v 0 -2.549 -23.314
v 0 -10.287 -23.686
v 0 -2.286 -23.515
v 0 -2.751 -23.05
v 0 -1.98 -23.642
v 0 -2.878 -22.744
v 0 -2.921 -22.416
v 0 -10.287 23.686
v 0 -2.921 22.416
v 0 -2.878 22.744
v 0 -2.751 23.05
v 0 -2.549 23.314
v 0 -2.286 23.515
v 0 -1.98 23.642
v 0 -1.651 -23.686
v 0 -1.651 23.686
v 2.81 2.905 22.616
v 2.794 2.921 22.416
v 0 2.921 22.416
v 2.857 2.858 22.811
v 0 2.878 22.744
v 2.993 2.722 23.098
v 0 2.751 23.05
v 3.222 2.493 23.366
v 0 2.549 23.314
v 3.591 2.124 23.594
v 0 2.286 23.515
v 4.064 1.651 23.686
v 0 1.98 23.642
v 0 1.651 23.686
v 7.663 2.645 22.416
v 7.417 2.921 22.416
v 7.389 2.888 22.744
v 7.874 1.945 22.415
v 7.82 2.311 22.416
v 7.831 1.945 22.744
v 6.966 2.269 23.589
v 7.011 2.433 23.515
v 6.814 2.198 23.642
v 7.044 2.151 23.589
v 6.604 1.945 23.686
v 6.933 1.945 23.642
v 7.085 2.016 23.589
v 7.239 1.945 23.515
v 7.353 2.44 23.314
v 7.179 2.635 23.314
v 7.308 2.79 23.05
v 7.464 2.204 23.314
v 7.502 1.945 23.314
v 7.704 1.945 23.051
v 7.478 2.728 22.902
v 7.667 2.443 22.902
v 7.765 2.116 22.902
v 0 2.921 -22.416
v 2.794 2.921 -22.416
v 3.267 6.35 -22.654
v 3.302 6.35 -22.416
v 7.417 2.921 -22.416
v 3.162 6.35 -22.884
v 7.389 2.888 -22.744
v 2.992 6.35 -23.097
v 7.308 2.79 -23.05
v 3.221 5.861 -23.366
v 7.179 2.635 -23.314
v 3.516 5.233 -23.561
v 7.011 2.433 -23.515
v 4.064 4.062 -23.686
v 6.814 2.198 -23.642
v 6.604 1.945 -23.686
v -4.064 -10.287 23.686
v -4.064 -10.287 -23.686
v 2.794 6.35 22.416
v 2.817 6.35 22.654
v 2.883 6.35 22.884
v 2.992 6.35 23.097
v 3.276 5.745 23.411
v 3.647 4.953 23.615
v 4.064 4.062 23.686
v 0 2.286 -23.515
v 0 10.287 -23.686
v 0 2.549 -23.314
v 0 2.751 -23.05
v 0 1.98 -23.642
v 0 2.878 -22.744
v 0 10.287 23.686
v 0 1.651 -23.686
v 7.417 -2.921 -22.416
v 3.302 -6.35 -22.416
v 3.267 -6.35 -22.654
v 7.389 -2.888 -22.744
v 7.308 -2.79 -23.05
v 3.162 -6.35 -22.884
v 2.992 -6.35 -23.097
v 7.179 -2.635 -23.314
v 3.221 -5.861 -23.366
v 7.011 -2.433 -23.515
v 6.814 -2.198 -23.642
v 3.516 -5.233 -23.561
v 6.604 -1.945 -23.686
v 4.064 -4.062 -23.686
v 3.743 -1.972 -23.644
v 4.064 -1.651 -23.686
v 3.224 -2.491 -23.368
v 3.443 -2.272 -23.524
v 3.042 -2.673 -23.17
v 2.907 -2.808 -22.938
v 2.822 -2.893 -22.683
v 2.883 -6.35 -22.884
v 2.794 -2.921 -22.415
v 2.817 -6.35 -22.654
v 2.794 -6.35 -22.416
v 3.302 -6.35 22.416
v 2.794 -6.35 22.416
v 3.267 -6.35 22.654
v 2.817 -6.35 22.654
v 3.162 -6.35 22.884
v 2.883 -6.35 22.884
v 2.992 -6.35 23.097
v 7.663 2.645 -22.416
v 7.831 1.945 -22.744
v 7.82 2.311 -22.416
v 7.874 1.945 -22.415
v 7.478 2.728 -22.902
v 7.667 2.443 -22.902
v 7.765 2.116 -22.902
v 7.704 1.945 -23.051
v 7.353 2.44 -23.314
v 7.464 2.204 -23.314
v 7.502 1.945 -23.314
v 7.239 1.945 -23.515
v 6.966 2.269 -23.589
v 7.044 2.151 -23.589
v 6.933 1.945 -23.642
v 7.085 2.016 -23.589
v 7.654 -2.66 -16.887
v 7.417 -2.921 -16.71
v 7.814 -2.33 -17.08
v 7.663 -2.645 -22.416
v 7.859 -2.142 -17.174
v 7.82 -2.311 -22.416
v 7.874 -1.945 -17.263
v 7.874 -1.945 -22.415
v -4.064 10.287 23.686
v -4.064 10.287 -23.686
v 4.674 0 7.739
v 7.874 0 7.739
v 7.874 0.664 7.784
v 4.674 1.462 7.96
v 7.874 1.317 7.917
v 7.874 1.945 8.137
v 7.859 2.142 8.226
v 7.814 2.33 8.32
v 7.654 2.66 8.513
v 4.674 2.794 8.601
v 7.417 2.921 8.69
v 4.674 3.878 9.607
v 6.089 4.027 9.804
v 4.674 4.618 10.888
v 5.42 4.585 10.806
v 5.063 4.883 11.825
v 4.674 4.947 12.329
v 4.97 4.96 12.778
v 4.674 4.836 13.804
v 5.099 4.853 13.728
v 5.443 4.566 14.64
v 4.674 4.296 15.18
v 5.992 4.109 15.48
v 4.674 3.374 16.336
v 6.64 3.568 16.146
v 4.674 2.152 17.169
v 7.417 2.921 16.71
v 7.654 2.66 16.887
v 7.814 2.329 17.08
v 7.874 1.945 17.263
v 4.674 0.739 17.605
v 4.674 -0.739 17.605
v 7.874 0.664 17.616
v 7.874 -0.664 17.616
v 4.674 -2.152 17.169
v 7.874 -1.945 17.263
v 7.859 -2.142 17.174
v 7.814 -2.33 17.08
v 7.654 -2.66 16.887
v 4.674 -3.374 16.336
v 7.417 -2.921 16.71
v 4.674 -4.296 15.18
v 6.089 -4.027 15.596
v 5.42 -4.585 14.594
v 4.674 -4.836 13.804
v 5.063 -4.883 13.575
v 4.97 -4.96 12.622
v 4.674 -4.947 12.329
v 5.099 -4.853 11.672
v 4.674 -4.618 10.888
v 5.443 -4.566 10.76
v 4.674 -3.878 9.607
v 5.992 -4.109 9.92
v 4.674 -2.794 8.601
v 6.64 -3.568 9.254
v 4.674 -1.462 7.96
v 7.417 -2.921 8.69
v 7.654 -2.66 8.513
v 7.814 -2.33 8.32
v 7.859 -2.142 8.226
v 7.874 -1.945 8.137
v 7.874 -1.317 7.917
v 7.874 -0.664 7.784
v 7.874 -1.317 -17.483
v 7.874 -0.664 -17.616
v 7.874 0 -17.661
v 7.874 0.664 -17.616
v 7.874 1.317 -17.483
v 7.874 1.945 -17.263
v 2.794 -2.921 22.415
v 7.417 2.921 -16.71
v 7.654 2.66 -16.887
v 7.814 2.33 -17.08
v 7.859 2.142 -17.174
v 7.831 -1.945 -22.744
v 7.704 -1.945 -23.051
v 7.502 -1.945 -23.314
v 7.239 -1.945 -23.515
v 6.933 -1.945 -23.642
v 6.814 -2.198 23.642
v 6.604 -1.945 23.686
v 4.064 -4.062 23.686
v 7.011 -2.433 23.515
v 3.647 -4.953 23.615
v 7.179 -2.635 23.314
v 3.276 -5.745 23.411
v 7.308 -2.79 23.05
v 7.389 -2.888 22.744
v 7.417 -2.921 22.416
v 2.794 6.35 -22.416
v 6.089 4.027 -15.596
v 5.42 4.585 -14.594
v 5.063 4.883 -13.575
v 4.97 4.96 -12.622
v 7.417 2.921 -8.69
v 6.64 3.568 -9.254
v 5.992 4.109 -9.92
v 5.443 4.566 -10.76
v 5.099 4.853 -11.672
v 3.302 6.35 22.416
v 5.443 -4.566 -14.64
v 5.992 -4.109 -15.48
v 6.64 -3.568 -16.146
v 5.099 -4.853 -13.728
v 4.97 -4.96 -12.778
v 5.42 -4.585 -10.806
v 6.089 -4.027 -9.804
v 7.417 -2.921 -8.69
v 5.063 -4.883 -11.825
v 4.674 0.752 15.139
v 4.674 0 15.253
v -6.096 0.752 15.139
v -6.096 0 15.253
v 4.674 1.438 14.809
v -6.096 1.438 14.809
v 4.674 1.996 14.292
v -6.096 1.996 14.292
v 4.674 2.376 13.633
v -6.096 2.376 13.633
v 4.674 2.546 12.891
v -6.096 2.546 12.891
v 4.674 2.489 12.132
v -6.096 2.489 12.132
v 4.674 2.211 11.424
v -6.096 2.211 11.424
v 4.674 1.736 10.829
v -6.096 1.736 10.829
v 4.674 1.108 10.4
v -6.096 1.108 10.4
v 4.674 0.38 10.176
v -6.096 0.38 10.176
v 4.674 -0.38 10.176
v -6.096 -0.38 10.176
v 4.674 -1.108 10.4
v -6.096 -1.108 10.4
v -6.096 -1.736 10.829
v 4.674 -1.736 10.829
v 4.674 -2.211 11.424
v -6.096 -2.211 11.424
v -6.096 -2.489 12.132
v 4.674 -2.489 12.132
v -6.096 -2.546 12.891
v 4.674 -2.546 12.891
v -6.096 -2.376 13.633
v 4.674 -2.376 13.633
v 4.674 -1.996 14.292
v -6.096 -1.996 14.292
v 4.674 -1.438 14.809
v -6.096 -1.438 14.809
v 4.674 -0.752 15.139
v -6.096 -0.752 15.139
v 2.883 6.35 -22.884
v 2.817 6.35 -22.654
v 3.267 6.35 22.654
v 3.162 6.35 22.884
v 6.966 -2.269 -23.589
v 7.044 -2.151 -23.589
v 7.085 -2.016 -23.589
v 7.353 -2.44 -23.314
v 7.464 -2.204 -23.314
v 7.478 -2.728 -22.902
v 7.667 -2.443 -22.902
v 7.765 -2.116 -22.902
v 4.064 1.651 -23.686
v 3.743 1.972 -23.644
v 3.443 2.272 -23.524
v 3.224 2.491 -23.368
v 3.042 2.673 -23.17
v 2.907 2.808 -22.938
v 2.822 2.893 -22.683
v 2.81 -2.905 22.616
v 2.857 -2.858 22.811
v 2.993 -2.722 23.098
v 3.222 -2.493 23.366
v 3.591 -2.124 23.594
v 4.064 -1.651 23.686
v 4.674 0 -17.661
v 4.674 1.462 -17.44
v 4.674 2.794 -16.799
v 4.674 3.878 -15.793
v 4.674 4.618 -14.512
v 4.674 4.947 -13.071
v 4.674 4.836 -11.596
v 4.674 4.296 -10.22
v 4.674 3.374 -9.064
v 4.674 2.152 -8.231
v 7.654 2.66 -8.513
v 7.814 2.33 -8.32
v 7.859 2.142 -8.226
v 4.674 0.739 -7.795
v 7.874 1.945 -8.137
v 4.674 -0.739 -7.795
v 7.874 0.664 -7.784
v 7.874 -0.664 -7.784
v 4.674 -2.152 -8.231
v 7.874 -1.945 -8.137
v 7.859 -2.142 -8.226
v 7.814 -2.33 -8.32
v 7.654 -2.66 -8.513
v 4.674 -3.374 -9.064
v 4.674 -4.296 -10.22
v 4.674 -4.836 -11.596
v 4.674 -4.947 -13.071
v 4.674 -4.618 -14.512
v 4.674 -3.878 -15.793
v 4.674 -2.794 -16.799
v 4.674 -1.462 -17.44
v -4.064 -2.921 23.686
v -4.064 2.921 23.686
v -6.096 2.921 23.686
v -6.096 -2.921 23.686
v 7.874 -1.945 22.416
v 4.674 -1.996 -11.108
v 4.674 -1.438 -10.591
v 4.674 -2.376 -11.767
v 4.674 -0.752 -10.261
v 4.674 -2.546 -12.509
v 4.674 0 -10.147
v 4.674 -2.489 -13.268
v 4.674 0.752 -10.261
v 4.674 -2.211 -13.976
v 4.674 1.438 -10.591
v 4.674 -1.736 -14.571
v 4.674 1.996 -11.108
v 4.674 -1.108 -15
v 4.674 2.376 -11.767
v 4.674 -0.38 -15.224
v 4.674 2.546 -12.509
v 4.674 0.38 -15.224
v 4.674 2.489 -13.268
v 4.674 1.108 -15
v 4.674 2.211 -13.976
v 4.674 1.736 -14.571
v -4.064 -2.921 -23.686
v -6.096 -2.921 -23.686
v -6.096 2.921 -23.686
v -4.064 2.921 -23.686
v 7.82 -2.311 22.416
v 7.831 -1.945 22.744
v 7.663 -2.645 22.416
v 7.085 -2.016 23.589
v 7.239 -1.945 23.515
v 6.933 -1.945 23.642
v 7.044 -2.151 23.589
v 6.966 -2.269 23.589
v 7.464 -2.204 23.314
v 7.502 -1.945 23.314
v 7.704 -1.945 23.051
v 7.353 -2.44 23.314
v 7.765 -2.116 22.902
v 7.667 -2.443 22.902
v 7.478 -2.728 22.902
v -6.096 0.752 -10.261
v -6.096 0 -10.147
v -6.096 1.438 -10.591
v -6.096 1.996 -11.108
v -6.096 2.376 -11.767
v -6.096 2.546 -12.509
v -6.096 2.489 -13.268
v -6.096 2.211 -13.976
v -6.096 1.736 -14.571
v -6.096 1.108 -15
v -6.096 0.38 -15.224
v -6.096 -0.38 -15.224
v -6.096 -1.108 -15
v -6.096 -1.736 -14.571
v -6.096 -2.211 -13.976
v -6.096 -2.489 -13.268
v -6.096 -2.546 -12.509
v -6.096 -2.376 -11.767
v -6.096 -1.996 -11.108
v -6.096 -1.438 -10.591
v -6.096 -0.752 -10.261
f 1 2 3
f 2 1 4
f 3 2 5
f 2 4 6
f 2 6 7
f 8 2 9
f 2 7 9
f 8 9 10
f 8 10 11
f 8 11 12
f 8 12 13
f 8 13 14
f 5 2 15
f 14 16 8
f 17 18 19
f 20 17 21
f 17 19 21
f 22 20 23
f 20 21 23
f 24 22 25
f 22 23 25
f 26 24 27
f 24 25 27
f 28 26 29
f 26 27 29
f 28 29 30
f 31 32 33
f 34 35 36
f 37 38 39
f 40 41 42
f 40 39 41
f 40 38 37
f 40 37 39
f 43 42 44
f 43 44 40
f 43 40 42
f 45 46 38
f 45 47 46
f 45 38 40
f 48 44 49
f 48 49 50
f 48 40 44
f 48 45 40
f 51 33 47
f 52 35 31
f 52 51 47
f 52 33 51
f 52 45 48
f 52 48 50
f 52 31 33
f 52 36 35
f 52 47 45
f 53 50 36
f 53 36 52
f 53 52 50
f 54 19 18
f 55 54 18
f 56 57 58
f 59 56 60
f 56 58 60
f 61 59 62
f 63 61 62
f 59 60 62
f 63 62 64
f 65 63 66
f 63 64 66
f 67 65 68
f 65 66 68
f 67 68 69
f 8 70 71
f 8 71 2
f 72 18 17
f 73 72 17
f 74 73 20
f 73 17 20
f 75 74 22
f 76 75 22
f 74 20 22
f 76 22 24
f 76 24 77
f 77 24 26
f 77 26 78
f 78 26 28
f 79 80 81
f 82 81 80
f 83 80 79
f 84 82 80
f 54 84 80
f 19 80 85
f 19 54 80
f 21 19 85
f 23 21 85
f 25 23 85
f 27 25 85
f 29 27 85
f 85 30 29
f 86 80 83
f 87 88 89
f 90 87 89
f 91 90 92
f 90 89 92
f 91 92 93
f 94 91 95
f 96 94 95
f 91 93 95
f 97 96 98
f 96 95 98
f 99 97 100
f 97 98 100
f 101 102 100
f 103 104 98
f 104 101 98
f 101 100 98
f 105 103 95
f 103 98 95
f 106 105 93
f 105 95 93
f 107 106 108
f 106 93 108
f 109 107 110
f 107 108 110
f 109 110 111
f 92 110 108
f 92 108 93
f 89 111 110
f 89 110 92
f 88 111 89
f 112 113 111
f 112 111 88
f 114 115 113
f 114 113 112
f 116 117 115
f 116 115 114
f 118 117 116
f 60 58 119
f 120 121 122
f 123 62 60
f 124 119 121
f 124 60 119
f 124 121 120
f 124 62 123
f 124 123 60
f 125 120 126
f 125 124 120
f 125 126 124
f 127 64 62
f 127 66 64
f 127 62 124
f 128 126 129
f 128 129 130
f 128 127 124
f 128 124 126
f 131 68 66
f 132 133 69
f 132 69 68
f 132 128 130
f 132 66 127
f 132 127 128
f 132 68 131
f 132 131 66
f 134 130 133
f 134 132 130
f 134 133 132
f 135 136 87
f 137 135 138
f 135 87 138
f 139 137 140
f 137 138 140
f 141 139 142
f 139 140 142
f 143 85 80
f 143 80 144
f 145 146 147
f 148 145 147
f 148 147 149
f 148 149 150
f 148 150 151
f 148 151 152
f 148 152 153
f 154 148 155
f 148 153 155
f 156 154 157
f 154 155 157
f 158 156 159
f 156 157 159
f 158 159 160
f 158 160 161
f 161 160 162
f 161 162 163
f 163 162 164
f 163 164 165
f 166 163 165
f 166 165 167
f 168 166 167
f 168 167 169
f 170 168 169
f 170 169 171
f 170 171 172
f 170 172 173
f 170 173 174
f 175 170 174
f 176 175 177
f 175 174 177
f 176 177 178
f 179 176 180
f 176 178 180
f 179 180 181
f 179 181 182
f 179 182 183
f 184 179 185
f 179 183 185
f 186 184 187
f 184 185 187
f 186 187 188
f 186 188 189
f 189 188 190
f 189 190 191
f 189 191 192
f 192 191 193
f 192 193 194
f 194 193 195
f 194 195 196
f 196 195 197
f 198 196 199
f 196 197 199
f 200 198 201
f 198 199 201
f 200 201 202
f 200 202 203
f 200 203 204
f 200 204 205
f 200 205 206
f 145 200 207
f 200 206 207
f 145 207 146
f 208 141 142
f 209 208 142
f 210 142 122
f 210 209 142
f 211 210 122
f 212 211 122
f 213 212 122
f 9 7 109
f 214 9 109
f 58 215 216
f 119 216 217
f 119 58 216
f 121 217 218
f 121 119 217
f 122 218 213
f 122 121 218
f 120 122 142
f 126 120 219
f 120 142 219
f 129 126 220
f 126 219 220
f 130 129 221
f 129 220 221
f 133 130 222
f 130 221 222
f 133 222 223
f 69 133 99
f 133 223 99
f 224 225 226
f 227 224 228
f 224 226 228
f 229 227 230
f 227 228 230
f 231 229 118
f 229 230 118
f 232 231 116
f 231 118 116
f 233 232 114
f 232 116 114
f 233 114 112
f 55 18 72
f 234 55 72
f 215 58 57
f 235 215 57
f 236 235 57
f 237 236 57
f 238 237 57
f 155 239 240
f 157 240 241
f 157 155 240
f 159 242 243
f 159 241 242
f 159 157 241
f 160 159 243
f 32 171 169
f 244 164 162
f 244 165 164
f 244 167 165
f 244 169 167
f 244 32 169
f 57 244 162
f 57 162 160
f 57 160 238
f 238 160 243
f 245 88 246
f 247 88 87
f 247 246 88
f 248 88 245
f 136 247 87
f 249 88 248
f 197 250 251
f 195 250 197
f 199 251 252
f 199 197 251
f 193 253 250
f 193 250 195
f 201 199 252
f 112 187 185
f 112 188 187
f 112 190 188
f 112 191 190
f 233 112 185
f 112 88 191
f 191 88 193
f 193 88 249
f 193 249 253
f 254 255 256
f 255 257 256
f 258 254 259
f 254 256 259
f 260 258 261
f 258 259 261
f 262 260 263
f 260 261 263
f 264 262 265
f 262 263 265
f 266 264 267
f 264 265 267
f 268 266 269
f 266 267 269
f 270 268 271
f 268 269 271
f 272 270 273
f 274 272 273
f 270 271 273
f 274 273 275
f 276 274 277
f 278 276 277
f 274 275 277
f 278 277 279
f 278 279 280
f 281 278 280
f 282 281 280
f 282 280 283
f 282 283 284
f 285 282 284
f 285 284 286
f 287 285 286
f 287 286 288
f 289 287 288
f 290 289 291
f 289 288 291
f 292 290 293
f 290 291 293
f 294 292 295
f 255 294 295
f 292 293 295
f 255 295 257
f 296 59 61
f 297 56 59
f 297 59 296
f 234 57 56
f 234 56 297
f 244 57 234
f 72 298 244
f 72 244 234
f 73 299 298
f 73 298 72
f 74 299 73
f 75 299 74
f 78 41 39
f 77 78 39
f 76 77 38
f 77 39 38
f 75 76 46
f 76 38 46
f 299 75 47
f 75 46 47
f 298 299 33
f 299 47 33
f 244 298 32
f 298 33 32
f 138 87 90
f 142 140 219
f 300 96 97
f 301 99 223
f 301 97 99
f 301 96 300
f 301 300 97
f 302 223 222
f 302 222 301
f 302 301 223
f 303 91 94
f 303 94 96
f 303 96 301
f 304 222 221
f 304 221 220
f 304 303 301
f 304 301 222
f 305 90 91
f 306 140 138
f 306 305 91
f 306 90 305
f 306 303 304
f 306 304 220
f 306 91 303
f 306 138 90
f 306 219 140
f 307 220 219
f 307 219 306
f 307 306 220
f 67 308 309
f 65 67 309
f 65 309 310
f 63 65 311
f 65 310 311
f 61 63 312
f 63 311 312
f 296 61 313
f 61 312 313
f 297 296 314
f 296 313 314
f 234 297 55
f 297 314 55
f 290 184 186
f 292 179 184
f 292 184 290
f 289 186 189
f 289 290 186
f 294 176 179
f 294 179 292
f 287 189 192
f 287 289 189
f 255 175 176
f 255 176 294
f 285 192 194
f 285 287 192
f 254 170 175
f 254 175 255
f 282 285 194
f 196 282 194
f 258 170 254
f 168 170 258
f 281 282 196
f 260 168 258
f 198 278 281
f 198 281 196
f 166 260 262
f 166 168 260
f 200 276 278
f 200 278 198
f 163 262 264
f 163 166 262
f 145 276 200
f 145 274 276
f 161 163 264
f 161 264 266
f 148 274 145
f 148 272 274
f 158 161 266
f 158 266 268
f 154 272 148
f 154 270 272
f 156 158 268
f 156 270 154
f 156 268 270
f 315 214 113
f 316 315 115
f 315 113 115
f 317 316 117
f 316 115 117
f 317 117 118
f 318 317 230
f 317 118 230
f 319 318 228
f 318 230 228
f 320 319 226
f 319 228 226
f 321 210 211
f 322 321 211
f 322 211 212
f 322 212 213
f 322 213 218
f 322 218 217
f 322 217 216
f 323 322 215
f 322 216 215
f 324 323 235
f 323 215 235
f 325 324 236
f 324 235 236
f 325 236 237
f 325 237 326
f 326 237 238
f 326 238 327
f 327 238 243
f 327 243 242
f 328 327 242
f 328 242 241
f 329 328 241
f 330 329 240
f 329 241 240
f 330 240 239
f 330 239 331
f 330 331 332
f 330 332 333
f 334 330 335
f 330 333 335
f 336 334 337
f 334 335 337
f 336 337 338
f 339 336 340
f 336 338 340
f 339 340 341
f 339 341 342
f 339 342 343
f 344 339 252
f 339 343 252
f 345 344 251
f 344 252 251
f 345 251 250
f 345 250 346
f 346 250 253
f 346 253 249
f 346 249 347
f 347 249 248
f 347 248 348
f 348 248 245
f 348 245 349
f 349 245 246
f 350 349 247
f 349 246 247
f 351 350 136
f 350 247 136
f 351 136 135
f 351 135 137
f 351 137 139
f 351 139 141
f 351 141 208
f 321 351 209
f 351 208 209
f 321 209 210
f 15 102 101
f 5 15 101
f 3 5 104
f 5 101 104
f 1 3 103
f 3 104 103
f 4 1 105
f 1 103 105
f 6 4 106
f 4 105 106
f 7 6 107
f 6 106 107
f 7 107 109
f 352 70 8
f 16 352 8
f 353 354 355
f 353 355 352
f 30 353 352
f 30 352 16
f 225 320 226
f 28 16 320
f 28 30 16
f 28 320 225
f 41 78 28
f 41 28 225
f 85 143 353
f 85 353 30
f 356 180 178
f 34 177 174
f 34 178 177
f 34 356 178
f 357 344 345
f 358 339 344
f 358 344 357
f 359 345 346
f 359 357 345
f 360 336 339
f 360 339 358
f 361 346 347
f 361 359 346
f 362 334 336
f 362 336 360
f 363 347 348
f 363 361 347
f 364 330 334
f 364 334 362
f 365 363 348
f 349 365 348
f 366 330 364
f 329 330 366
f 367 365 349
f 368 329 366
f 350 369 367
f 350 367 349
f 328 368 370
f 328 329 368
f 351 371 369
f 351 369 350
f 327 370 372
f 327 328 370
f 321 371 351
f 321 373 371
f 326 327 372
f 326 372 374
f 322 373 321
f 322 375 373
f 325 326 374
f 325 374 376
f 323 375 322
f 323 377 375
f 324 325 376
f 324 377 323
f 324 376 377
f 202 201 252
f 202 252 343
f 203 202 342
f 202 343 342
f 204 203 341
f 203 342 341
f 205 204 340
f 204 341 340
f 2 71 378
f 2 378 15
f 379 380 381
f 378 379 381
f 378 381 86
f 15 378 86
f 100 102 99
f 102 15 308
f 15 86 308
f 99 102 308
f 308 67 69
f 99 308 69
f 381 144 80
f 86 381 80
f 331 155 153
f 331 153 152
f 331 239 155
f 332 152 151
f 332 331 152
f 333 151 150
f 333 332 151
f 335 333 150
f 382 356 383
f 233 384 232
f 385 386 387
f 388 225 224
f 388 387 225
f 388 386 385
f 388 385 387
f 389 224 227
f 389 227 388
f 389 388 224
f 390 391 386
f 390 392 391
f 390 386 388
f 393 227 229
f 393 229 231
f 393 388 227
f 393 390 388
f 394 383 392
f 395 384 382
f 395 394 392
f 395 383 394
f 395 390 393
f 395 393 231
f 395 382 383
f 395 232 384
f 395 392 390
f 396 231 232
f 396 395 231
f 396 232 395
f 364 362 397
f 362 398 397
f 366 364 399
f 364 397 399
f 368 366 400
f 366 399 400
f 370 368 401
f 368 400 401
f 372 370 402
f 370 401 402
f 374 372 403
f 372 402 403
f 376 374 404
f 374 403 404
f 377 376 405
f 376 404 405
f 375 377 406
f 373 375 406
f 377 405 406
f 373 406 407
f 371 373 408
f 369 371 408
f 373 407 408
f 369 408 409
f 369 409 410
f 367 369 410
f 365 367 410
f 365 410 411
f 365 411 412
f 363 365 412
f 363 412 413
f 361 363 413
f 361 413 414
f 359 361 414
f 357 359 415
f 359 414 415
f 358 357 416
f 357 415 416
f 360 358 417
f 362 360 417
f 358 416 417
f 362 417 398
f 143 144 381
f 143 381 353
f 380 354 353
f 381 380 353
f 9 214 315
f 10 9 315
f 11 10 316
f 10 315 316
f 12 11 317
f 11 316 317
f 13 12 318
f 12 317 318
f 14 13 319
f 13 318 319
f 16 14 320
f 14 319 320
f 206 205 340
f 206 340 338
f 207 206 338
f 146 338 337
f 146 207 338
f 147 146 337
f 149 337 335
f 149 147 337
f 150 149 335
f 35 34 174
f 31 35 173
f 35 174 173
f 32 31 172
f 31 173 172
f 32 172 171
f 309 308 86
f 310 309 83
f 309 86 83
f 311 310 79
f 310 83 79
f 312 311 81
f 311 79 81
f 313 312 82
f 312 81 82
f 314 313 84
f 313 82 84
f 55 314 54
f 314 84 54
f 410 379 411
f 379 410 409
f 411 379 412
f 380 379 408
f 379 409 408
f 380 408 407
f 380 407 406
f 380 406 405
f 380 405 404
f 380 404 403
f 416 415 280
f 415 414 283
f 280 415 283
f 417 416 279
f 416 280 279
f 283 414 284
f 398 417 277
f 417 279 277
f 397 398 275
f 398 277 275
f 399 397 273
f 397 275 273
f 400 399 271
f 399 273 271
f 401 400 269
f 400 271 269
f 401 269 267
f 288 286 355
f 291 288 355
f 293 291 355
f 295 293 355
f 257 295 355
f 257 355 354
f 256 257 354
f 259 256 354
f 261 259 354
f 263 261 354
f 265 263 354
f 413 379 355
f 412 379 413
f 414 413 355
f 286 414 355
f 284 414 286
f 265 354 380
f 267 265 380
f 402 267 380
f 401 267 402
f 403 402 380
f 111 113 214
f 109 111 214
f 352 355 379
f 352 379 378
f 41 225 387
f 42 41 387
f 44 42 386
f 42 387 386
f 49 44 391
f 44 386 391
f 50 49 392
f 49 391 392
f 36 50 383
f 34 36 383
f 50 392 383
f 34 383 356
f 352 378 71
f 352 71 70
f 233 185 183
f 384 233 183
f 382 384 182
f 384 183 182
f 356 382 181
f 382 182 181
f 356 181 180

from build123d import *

# Parameters (mm, degrees)
BOSS_EXTRUDE1_DEPTH                             = 47.371
SKETCH2_W                                       = 6.858
SKETCH2_H                                       = 3.429
CUT_EXTRUDE1_DEPTH                              = 49.438972089
SKETCH3_W                                       = 4.064
SKETCH3_H                                       = 47.371
BOSS_EXTRUDE2_DEPTH                             = 7.366
SKETCH4_W                                       = 6.858
SKETCH4_H                                       = 3.429
CUT_EXTRUDE2_DEPTH                              = 50.110425431
SKETCH5_W                                       = 4.064
SKETCH5_H                                       = 47.371
BOSS_EXTRUDE3_DEPTH                             = 7.366
F_3_CLEARANCE_HOLE1_D                           = 2.7686
SKETCH9_W                                       = 2.032
SKETCH9_H                                       = 5.842
BOSS_EXTRUDE4_DEPTH                             = 47.371
SKETCH10_R                                      = 1.3843
CUT_EXTRUDE3_DEPTH                              = 2.54
CBORE_FOR_10_BUTTON_HEAD_CAP_SCREW1_D           = 5.1054
CBORE_FOR_10_BUTTON_HEAD_CAP_SCREW1_CBORE_D     = 9.92124
CBORE_FOR_10_BUTTON_HEAD_CAP_SCREW1_CBORE_DEPTH = 3.2004
FILLET1_R                                       = 1.27
FILLET3_R                                       = 1.27
FILLET5_R                                       = 1.27


with BuildPart() as part:
    # Sketch1 → Boss-Extrude1 (new body)
    with BuildSketch(Plane.XY.offset(23.6855)):
        Polygon((3.302, 6.35), (-4.064, 6.35), (-4.064, -6.35), (3.302, -6.35), (7.874, -2.54), (7.874, 2.54), align=None)
    extrude(amount=-BOSS_EXTRUDE1_DEPTH)

    # Sketch2 → Cut-Extrude1 (cut, through all)
    with BuildSketch(Plane.XY.offset(23.6855)):
        with Locations((-0.635, 4.6355)):
            Rectangle(SKETCH2_W, SKETCH2_H)
    extrude(amount=-CUT_EXTRUDE1_DEPTH, mode=Mode.SUBTRACT)

    # Sketch3 → Boss-Extrude2 (add)
    with BuildSketch(Plane(origin=(0, 2.921, 0), x_dir=(-1, 0, 0), z_dir=(0, 1, 0))):
        with Locations((2.032, 0)):
            Rectangle(SKETCH3_W, SKETCH3_H)
    extrude(amount=BOSS_EXTRUDE2_DEPTH)

    # Sketch4 → Cut-Extrude2 (cut, through all)
    with BuildSketch(Plane.XY.offset(23.6855)):
        with Locations((-0.635, -4.6355)):
            Rectangle(SKETCH4_W, SKETCH4_H)
    extrude(amount=-CUT_EXTRUDE2_DEPTH, mode=Mode.SUBTRACT)

    # Sketch5 → Boss-Extrude3 (add)
    with BuildSketch(Plane.XZ.offset(2.921)):
        with Locations((-2.032, 0)):
            Rectangle(SKETCH5_W, SKETCH5_H)
    extrude(amount=BOSS_EXTRUDE3_DEPTH)

    # #3 Clearance Hole1 (through all)
    with Locations(Plane.ZY.offset(4.064)):
        with Locations((12.7, 0), (-12.7, 0)):
            Hole(F_3_CLEARANCE_HOLE1_D / 2)

    # Sketch9 → Boss-Extrude4 (add, through all)
    with BuildSketch(Plane.XY.offset(23.6855)):
        with Locations((-5.08, 0)):
            Rectangle(SKETCH9_W, SKETCH9_H)
    extrude(amount=-BOSS_EXTRUDE4_DEPTH)

    # Sketch10 → Cut-Extrude3 (cut)
    with BuildSketch(Plane(origin=(-4.064, 0, 0), x_dir=(0, 0, -1), z_dir=(1, 0, 0))):
        with Locations(Location((-12.7, 0, 0), (0, 0, 180))):
            Circle(SKETCH10_R)
    extrude(amount=-CUT_EXTRUDE3_DEPTH, mode=Mode.SUBTRACT)

    # CBORE for #10 Button Head Cap Screw1 (through all)
    with Locations(Plane(origin=(7.874, 0, 0), x_dir=(0, 0, -1), z_dir=(1, 0, 0))):
        with Locations((-12.7, 0), (12.7, 0)):
            CounterBoreHole(CBORE_FOR_10_BUTTON_HEAD_CAP_SCREW1_D / 2, CBORE_FOR_10_BUTTON_HEAD_CAP_SCREW1_CBORE_D / 2, CBORE_FOR_10_BUTTON_HEAD_CAP_SCREW1_CBORE_DEPTH)

    # Fillet1
    fillet1_edges = [part.edges().sort_by_distance(p)[0] for p in [
        (7.874, -2.54, 20.323251747),
        (7.874, -2.54, -20.323251747),
        (7.874, -2.54, 0),
        (7.874, 2.54, 20.323251747),
        (7.874, 2.54, 0),
        (7.874, 2.54, -20.323251747),
    ]]
    fillet(fillet1_edges, radius=FILLET1_R)

    # Fillet3
    # the kernel refuses this fillet: 1.27 mm, written as the material it takes off along each edge
    with BuildSketch(Plane(origin=(0.862897437, -8.382585469, -23.6855), x_dir=(0, 0, 1), z_dir=(0.7682212795973759, 0.6401843996644799, 0)), Plane(origin=(7.417034188, 2.920804844, -23.6855), x_dir=(0, 0, 1), z_dir=(-0.7682212795973759, 0.6401843996644799, 0))) as fillet3_piece_1:
        with BuildLine():
            CenterArc((FILLET3_R, -FILLET3_R), FILLET3_R, 90, 90)
            Line((0, -FILLET3_R), (0, 0))
            Line((0, 0), (FILLET3_R, 0))
        make_face()
    extrude(amount=8.531574072, mode=Mode.SUBTRACT)
    with BuildSketch(Plane(origin=(6.604, -1.945163819, -23.6855), x_dir=(0.6401843996644796, -0.7682212795973762, 0), z_dir=(-0.7682212795973762, -0.6401843996644796, 0))) as fillet3_piece_2:
        with BuildLine():
            CenterArc((1.27 - FILLET3_R, FILLET3_R), FILLET3_R, 270, 90)
            Line((1.27, FILLET3_R), (1.27, 0))
            Line((1.27, 0), (1.27 - FILLET3_R, 0))
        make_face()
    revolve(axis=Axis((6.604, -1.945163819, -23.6855), (0, 0, 1)), revolution_arc=50.194428908, mode=Mode.SUBTRACT)
    with BuildSketch(Plane(origin=(6.604, 1.945163819, -23.6855), x_dir=(0.6401843996644799, 0.7682212795973757, 0), z_dir=(-0.7682212795973757, 0.6401843996644799, 0))) as fillet3_piece_3:
        with BuildLine():
            CenterArc((1.27 - FILLET3_R, -FILLET3_R), FILLET3_R, 0, 90)
            Line((1.27, -FILLET3_R), (1.27, 0))
            Line((1.27, 0), (1.27 - FILLET3_R, 0))
        make_face()
    revolve(axis=Axis((6.604, 1.945163819, -23.6855), (0, 0, -1)), revolution_arc=50.194428908, mode=Mode.SUBTRACT)
    with BuildSketch(Plane(origin=(2.794, -2.921, -23.6855), x_dir=(0, 0, 1), z_dir=(-1, 0, 0)), Plane(origin=(0, 2.921, -23.6855), x_dir=(0, 0, 1), z_dir=(1, 0, 0))) as fillet3_piece_4:
        with BuildLine():
            CenterArc((FILLET3_R, FILLET3_R), FILLET3_R, 180, 90)
            Line((0, FILLET3_R), (0, 0))
            Line((0, 0), (FILLET3_R, 0))
        make_face()
    extrude(amount=2.794, mode=Mode.SUBTRACT)
    with BuildSketch(Plane(origin=(2.794, 2.921, -23.6855), x_dir=(0, 0, 1), z_dir=(0, 1, 0)), Plane(origin=(2.794, -9.525, -23.6855), x_dir=(0, 0, 1), z_dir=(0, 1, 0))) as fillet3_piece_5:
        with BuildLine():
            CenterArc((FILLET3_R, FILLET3_R), FILLET3_R, 180, 90)
            Line((0, FILLET3_R), (0, 0))
            Line((0, 0), (FILLET3_R, 0))
        make_face()
    extrude(amount=6.604, mode=Mode.SUBTRACT)
    with BuildSketch(Plane(origin=(7.874, -1.945163819, -23.6855), x_dir=(-1, 0, 0), z_dir=(0, 1, 0))) as fillet3_piece_6:
        with BuildLine():
            CenterArc((FILLET3_R, FILLET3_R), FILLET3_R, 180, 90)
            Line((0, FILLET3_R), (0, 0))
            Line((0, 0), (FILLET3_R, 0))
        make_face()
    extrude(amount=3.890327637, mode=Mode.SUBTRACT)
    with BuildSketch(Plane(origin=(2.794, -9.525, -23.6855), x_dir=(0, 0, 1), z_dir=(0, 1, 0))) as fillet3_piece_7a_section:
        with BuildLine():
            CenterArc((FILLET3_R, FILLET3_R), FILLET3_R, 180, 90)
            Line((0, FILLET3_R), (0, 0))
            Line((0, 0), (FILLET3_R, 0))
        make_face()
    fillet3_piece_7a = extrude(amount=9.779, mode=Mode.PRIVATE)
    fillet3_piece_7a = split(fillet3_piece_7a, bisect_by=Plane(origin=(3.081521795, -2.921, -23.397978205), z_dir=(0, 1, 0)), keep=Keep.TOP, mode=Mode.PRIVATE)
    with BuildSketch(Plane(origin=(5.969, -2.921, -23.6855), x_dir=(0, 0, 1), z_dir=(-1, 0, 0))) as fillet3_piece_7b_section:
        with BuildLine():
            CenterArc((FILLET3_R, FILLET3_R), FILLET3_R, 180, 90)
            Line((0, FILLET3_R), (0, 0))
            Line((0, 0), (FILLET3_R, 0))
        make_face()
    fillet3_piece_7b = extrude(amount=5.969, mode=Mode.PRIVATE)
    fillet3_piece_7b = split(fillet3_piece_7b, bisect_by=Plane(origin=(2.794, -2.633478205, -23.397978205), z_dir=(1, 0, 0)), keep=Keep.TOP, mode=Mode.PRIVATE)
    fillet3_piece_7 = fillet3_piece_7a & fillet3_piece_7b
    add(fillet3_piece_7, mode=Mode.SUBTRACT)
    with BuildSketch(Plane(origin=(2.794, -0.254, -23.6855), x_dir=(0, 0, 1), z_dir=(0, 1, 0))) as fillet3_piece_8a_section:
        with BuildLine():
            CenterArc((FILLET3_R, FILLET3_R), FILLET3_R, 180, 90)
            Line((0, FILLET3_R), (0, 0))
            Line((0, 0), (FILLET3_R, 0))
        make_face()
    fillet3_piece_8a = extrude(amount=9.779, mode=Mode.PRIVATE)
    fillet3_piece_8a = split(fillet3_piece_8a, bisect_by=Plane(origin=(3.081521795, 2.921, -23.397978205), z_dir=(0, -1, 0)), keep=Keep.TOP, mode=Mode.PRIVATE)
    with BuildSketch(Plane(origin=(0, 2.921, -23.6855), x_dir=(0, 0, 1), z_dir=(1, 0, 0))) as fillet3_piece_8b_section:
        with BuildLine():
            CenterArc((FILLET3_R, FILLET3_R), FILLET3_R, 180, 90)
            Line((0, FILLET3_R), (0, 0))
            Line((0, 0), (FILLET3_R, 0))
        make_face()
    fillet3_piece_8b = extrude(amount=5.969, mode=Mode.PRIVATE)
    fillet3_piece_8b = split(fillet3_piece_8b, bisect_by=Plane(origin=(2.794, 2.633478205, -23.397978205), z_dir=(1, 0, 0)), keep=Keep.TOP, mode=Mode.PRIVATE)
    fillet3_piece_8 = fillet3_piece_8a & fillet3_piece_8b
    add(fillet3_piece_8, mode=Mode.SUBTRACT)

    # Fillet5
    # the kernel refuses this fillet: 1.27 mm, written as the material it takes off along each edge
    with BuildSketch(Plane(origin=(0.862897437, -8.382585469, 23.6855), x_dir=(-0.6401843996644799, 0.7682212795973759, 0), z_dir=(0.7682212795973759, 0.6401843996644799, 0)), Plane(origin=(7.417034188, 2.920804844, 23.6855), x_dir=(-0.6401843996644799, -0.7682212795973759, 0), z_dir=(-0.7682212795973759, 0.6401843996644799, 0))) as fillet5_piece_1:
        with BuildLine():
            CenterArc((FILLET5_R, -FILLET5_R), FILLET5_R, 90, 90)
            Line((0, -FILLET5_R), (0, 0))
            Line((0, 0), (FILLET5_R, 0))
        make_face()
    extrude(amount=8.531574072, mode=Mode.SUBTRACT)
    with BuildSketch(Plane(origin=(6.604, -1.945163819, 23.6855), x_dir=(1, 0, 0), z_dir=(0, 1, 0))) as fillet5_piece_2:
        with BuildLine():
            CenterArc((1.27 - FILLET5_R, FILLET5_R), FILLET5_R, 270, 90)
            Line((1.27, FILLET5_R), (1.27, 0))
            Line((1.27, 0), (1.27 - FILLET5_R, 0))
        make_face()
    revolve(axis=Axis((6.604, -1.945163819, 23.6855), (0, 0, -1)), revolution_arc=50.194428908, mode=Mode.SUBTRACT)
    with BuildSketch(Plane(origin=(6.604, 1.945163819, 23.6855), x_dir=(0.6401843996644799, 0.7682212795973757, 0), z_dir=(-0.7682212795973757, 0.6401843996644799, 0))) as fillet5_piece_3:
        with BuildLine():
            CenterArc((1.27 - FILLET5_R, FILLET5_R), FILLET5_R, 270, 90)
            Line((1.27, FILLET5_R), (1.27, 0))
            Line((1.27, 0), (1.27 - FILLET5_R, 0))
        make_face()
    revolve(axis=Axis((6.604, 1.945163819, 23.6855), (0, 0, -1)), revolution_arc=50.194428908, mode=Mode.SUBTRACT)
    with BuildSketch(Plane(origin=(2.794, 2.921, 23.6855), x_dir=(1, 0, 0), z_dir=(0, 1, 0)), Plane(origin=(2.794, -9.525, 23.6855), x_dir=(1, 0, 0), z_dir=(0, 1, 0))) as fillet5_piece_4:
        with BuildLine():
            CenterArc((FILLET5_R, FILLET5_R), FILLET5_R, 180, 90)
            Line((0, FILLET5_R), (0, 0))
            Line((0, 0), (FILLET5_R, 0))
        make_face()
    extrude(amount=6.604, mode=Mode.SUBTRACT)
    with BuildSketch(Plane(origin=(0, 2.921, 23.6855), x_dir=(0, -1, 0), z_dir=(1, 0, 0)), Plane(origin=(2.794, -2.921, 23.6855), x_dir=(0, 1, 0), z_dir=(-1, 0, 0))) as fillet5_piece_5:
        with BuildLine():
            CenterArc((FILLET5_R, FILLET5_R), FILLET5_R, 180, 90)
            Line((0, FILLET5_R), (0, 0))
            Line((0, 0), (FILLET5_R, 0))
        make_face()
    extrude(amount=2.794, mode=Mode.SUBTRACT)
    with BuildSketch(Plane(origin=(7.874, -1.945163819, 23.6855), x_dir=(-1, 0, 0), z_dir=(0, 1, 0))) as fillet5_piece_6:
        with BuildLine():
            CenterArc((FILLET5_R, -FILLET5_R), FILLET5_R, 90, 90)
            Line((0, -FILLET5_R), (0, 0))
            Line((0, 0), (FILLET5_R, 0))
        make_face()
    extrude(amount=3.890327637, mode=Mode.SUBTRACT)
    with BuildSketch(Plane(origin=(2.794, -0.254, 23.6855), x_dir=(1, 0, 0), z_dir=(0, 1, 0))) as fillet5_piece_7a_section:
        with BuildLine():
            CenterArc((FILLET5_R, FILLET5_R), FILLET5_R, 180, 90)
            Line((0, FILLET5_R), (0, 0))
            Line((0, 0), (FILLET5_R, 0))
        make_face()
    fillet5_piece_7a = extrude(amount=9.779, mode=Mode.PRIVATE)
    fillet5_piece_7a = split(fillet5_piece_7a, bisect_by=Plane(origin=(3.081521795, 2.921, 23.397978205), z_dir=(0, -1, 0)), keep=Keep.TOP, mode=Mode.PRIVATE)
    with BuildSketch(Plane(origin=(0, 2.921, 23.6855), x_dir=(0, -1, 0), z_dir=(1, 0, 0))) as fillet5_piece_7b_section:
        with BuildLine():
            CenterArc((FILLET5_R, FILLET5_R), FILLET5_R, 180, 90)
            Line((0, FILLET5_R), (0, 0))
            Line((0, 0), (FILLET5_R, 0))
        make_face()
    fillet5_piece_7b = extrude(amount=5.969, mode=Mode.PRIVATE)
    fillet5_piece_7b = split(fillet5_piece_7b, bisect_by=Plane(origin=(2.794, 2.633478205, 23.397978205), z_dir=(1, 0, 0)), keep=Keep.TOP, mode=Mode.PRIVATE)
    fillet5_piece_7 = fillet5_piece_7a & fillet5_piece_7b
    add(fillet5_piece_7, mode=Mode.SUBTRACT)
    with BuildSketch(Plane(origin=(2.794, -9.525, 23.6855), x_dir=(1, 0, 0), z_dir=(0, 1, 0))) as fillet5_piece_8a_section:
        with BuildLine():
            CenterArc((FILLET5_R, FILLET5_R), FILLET5_R, 180, 90)
            Line((0, FILLET5_R), (0, 0))
            Line((0, 0), (FILLET5_R, 0))
        make_face()
    fillet5_piece_8a = extrude(amount=9.779, mode=Mode.PRIVATE)
    fillet5_piece_8a = split(fillet5_piece_8a, bisect_by=Plane(origin=(3.081521795, -2.921, 23.397978205), z_dir=(0, 1, 0)), keep=Keep.TOP, mode=Mode.PRIVATE)
    with BuildSketch(Plane(origin=(5.969, -2.921, 23.6855), x_dir=(0, 1, 0), z_dir=(-1, 0, 0))) as fillet5_piece_8b_section:
        with BuildLine():
            CenterArc((FILLET5_R, FILLET5_R), FILLET5_R, 180, 90)
            Line((0, FILLET5_R), (0, 0))
            Line((0, 0), (FILLET5_R, 0))
        make_face()
    fillet5_piece_8b = extrude(amount=5.969, mode=Mode.PRIVATE)
    fillet5_piece_8b = split(fillet5_piece_8b, bisect_by=Plane(origin=(2.794, -2.633478205, 23.397978205), z_dir=(1, 0, 0)), keep=Keep.TOP, mode=Mode.PRIVATE)
    fillet5_piece_8 = fillet5_piece_8a & fillet5_piece_8b
    add(fillet5_piece_8, mode=Mode.SUBTRACT)


solid = part.part
